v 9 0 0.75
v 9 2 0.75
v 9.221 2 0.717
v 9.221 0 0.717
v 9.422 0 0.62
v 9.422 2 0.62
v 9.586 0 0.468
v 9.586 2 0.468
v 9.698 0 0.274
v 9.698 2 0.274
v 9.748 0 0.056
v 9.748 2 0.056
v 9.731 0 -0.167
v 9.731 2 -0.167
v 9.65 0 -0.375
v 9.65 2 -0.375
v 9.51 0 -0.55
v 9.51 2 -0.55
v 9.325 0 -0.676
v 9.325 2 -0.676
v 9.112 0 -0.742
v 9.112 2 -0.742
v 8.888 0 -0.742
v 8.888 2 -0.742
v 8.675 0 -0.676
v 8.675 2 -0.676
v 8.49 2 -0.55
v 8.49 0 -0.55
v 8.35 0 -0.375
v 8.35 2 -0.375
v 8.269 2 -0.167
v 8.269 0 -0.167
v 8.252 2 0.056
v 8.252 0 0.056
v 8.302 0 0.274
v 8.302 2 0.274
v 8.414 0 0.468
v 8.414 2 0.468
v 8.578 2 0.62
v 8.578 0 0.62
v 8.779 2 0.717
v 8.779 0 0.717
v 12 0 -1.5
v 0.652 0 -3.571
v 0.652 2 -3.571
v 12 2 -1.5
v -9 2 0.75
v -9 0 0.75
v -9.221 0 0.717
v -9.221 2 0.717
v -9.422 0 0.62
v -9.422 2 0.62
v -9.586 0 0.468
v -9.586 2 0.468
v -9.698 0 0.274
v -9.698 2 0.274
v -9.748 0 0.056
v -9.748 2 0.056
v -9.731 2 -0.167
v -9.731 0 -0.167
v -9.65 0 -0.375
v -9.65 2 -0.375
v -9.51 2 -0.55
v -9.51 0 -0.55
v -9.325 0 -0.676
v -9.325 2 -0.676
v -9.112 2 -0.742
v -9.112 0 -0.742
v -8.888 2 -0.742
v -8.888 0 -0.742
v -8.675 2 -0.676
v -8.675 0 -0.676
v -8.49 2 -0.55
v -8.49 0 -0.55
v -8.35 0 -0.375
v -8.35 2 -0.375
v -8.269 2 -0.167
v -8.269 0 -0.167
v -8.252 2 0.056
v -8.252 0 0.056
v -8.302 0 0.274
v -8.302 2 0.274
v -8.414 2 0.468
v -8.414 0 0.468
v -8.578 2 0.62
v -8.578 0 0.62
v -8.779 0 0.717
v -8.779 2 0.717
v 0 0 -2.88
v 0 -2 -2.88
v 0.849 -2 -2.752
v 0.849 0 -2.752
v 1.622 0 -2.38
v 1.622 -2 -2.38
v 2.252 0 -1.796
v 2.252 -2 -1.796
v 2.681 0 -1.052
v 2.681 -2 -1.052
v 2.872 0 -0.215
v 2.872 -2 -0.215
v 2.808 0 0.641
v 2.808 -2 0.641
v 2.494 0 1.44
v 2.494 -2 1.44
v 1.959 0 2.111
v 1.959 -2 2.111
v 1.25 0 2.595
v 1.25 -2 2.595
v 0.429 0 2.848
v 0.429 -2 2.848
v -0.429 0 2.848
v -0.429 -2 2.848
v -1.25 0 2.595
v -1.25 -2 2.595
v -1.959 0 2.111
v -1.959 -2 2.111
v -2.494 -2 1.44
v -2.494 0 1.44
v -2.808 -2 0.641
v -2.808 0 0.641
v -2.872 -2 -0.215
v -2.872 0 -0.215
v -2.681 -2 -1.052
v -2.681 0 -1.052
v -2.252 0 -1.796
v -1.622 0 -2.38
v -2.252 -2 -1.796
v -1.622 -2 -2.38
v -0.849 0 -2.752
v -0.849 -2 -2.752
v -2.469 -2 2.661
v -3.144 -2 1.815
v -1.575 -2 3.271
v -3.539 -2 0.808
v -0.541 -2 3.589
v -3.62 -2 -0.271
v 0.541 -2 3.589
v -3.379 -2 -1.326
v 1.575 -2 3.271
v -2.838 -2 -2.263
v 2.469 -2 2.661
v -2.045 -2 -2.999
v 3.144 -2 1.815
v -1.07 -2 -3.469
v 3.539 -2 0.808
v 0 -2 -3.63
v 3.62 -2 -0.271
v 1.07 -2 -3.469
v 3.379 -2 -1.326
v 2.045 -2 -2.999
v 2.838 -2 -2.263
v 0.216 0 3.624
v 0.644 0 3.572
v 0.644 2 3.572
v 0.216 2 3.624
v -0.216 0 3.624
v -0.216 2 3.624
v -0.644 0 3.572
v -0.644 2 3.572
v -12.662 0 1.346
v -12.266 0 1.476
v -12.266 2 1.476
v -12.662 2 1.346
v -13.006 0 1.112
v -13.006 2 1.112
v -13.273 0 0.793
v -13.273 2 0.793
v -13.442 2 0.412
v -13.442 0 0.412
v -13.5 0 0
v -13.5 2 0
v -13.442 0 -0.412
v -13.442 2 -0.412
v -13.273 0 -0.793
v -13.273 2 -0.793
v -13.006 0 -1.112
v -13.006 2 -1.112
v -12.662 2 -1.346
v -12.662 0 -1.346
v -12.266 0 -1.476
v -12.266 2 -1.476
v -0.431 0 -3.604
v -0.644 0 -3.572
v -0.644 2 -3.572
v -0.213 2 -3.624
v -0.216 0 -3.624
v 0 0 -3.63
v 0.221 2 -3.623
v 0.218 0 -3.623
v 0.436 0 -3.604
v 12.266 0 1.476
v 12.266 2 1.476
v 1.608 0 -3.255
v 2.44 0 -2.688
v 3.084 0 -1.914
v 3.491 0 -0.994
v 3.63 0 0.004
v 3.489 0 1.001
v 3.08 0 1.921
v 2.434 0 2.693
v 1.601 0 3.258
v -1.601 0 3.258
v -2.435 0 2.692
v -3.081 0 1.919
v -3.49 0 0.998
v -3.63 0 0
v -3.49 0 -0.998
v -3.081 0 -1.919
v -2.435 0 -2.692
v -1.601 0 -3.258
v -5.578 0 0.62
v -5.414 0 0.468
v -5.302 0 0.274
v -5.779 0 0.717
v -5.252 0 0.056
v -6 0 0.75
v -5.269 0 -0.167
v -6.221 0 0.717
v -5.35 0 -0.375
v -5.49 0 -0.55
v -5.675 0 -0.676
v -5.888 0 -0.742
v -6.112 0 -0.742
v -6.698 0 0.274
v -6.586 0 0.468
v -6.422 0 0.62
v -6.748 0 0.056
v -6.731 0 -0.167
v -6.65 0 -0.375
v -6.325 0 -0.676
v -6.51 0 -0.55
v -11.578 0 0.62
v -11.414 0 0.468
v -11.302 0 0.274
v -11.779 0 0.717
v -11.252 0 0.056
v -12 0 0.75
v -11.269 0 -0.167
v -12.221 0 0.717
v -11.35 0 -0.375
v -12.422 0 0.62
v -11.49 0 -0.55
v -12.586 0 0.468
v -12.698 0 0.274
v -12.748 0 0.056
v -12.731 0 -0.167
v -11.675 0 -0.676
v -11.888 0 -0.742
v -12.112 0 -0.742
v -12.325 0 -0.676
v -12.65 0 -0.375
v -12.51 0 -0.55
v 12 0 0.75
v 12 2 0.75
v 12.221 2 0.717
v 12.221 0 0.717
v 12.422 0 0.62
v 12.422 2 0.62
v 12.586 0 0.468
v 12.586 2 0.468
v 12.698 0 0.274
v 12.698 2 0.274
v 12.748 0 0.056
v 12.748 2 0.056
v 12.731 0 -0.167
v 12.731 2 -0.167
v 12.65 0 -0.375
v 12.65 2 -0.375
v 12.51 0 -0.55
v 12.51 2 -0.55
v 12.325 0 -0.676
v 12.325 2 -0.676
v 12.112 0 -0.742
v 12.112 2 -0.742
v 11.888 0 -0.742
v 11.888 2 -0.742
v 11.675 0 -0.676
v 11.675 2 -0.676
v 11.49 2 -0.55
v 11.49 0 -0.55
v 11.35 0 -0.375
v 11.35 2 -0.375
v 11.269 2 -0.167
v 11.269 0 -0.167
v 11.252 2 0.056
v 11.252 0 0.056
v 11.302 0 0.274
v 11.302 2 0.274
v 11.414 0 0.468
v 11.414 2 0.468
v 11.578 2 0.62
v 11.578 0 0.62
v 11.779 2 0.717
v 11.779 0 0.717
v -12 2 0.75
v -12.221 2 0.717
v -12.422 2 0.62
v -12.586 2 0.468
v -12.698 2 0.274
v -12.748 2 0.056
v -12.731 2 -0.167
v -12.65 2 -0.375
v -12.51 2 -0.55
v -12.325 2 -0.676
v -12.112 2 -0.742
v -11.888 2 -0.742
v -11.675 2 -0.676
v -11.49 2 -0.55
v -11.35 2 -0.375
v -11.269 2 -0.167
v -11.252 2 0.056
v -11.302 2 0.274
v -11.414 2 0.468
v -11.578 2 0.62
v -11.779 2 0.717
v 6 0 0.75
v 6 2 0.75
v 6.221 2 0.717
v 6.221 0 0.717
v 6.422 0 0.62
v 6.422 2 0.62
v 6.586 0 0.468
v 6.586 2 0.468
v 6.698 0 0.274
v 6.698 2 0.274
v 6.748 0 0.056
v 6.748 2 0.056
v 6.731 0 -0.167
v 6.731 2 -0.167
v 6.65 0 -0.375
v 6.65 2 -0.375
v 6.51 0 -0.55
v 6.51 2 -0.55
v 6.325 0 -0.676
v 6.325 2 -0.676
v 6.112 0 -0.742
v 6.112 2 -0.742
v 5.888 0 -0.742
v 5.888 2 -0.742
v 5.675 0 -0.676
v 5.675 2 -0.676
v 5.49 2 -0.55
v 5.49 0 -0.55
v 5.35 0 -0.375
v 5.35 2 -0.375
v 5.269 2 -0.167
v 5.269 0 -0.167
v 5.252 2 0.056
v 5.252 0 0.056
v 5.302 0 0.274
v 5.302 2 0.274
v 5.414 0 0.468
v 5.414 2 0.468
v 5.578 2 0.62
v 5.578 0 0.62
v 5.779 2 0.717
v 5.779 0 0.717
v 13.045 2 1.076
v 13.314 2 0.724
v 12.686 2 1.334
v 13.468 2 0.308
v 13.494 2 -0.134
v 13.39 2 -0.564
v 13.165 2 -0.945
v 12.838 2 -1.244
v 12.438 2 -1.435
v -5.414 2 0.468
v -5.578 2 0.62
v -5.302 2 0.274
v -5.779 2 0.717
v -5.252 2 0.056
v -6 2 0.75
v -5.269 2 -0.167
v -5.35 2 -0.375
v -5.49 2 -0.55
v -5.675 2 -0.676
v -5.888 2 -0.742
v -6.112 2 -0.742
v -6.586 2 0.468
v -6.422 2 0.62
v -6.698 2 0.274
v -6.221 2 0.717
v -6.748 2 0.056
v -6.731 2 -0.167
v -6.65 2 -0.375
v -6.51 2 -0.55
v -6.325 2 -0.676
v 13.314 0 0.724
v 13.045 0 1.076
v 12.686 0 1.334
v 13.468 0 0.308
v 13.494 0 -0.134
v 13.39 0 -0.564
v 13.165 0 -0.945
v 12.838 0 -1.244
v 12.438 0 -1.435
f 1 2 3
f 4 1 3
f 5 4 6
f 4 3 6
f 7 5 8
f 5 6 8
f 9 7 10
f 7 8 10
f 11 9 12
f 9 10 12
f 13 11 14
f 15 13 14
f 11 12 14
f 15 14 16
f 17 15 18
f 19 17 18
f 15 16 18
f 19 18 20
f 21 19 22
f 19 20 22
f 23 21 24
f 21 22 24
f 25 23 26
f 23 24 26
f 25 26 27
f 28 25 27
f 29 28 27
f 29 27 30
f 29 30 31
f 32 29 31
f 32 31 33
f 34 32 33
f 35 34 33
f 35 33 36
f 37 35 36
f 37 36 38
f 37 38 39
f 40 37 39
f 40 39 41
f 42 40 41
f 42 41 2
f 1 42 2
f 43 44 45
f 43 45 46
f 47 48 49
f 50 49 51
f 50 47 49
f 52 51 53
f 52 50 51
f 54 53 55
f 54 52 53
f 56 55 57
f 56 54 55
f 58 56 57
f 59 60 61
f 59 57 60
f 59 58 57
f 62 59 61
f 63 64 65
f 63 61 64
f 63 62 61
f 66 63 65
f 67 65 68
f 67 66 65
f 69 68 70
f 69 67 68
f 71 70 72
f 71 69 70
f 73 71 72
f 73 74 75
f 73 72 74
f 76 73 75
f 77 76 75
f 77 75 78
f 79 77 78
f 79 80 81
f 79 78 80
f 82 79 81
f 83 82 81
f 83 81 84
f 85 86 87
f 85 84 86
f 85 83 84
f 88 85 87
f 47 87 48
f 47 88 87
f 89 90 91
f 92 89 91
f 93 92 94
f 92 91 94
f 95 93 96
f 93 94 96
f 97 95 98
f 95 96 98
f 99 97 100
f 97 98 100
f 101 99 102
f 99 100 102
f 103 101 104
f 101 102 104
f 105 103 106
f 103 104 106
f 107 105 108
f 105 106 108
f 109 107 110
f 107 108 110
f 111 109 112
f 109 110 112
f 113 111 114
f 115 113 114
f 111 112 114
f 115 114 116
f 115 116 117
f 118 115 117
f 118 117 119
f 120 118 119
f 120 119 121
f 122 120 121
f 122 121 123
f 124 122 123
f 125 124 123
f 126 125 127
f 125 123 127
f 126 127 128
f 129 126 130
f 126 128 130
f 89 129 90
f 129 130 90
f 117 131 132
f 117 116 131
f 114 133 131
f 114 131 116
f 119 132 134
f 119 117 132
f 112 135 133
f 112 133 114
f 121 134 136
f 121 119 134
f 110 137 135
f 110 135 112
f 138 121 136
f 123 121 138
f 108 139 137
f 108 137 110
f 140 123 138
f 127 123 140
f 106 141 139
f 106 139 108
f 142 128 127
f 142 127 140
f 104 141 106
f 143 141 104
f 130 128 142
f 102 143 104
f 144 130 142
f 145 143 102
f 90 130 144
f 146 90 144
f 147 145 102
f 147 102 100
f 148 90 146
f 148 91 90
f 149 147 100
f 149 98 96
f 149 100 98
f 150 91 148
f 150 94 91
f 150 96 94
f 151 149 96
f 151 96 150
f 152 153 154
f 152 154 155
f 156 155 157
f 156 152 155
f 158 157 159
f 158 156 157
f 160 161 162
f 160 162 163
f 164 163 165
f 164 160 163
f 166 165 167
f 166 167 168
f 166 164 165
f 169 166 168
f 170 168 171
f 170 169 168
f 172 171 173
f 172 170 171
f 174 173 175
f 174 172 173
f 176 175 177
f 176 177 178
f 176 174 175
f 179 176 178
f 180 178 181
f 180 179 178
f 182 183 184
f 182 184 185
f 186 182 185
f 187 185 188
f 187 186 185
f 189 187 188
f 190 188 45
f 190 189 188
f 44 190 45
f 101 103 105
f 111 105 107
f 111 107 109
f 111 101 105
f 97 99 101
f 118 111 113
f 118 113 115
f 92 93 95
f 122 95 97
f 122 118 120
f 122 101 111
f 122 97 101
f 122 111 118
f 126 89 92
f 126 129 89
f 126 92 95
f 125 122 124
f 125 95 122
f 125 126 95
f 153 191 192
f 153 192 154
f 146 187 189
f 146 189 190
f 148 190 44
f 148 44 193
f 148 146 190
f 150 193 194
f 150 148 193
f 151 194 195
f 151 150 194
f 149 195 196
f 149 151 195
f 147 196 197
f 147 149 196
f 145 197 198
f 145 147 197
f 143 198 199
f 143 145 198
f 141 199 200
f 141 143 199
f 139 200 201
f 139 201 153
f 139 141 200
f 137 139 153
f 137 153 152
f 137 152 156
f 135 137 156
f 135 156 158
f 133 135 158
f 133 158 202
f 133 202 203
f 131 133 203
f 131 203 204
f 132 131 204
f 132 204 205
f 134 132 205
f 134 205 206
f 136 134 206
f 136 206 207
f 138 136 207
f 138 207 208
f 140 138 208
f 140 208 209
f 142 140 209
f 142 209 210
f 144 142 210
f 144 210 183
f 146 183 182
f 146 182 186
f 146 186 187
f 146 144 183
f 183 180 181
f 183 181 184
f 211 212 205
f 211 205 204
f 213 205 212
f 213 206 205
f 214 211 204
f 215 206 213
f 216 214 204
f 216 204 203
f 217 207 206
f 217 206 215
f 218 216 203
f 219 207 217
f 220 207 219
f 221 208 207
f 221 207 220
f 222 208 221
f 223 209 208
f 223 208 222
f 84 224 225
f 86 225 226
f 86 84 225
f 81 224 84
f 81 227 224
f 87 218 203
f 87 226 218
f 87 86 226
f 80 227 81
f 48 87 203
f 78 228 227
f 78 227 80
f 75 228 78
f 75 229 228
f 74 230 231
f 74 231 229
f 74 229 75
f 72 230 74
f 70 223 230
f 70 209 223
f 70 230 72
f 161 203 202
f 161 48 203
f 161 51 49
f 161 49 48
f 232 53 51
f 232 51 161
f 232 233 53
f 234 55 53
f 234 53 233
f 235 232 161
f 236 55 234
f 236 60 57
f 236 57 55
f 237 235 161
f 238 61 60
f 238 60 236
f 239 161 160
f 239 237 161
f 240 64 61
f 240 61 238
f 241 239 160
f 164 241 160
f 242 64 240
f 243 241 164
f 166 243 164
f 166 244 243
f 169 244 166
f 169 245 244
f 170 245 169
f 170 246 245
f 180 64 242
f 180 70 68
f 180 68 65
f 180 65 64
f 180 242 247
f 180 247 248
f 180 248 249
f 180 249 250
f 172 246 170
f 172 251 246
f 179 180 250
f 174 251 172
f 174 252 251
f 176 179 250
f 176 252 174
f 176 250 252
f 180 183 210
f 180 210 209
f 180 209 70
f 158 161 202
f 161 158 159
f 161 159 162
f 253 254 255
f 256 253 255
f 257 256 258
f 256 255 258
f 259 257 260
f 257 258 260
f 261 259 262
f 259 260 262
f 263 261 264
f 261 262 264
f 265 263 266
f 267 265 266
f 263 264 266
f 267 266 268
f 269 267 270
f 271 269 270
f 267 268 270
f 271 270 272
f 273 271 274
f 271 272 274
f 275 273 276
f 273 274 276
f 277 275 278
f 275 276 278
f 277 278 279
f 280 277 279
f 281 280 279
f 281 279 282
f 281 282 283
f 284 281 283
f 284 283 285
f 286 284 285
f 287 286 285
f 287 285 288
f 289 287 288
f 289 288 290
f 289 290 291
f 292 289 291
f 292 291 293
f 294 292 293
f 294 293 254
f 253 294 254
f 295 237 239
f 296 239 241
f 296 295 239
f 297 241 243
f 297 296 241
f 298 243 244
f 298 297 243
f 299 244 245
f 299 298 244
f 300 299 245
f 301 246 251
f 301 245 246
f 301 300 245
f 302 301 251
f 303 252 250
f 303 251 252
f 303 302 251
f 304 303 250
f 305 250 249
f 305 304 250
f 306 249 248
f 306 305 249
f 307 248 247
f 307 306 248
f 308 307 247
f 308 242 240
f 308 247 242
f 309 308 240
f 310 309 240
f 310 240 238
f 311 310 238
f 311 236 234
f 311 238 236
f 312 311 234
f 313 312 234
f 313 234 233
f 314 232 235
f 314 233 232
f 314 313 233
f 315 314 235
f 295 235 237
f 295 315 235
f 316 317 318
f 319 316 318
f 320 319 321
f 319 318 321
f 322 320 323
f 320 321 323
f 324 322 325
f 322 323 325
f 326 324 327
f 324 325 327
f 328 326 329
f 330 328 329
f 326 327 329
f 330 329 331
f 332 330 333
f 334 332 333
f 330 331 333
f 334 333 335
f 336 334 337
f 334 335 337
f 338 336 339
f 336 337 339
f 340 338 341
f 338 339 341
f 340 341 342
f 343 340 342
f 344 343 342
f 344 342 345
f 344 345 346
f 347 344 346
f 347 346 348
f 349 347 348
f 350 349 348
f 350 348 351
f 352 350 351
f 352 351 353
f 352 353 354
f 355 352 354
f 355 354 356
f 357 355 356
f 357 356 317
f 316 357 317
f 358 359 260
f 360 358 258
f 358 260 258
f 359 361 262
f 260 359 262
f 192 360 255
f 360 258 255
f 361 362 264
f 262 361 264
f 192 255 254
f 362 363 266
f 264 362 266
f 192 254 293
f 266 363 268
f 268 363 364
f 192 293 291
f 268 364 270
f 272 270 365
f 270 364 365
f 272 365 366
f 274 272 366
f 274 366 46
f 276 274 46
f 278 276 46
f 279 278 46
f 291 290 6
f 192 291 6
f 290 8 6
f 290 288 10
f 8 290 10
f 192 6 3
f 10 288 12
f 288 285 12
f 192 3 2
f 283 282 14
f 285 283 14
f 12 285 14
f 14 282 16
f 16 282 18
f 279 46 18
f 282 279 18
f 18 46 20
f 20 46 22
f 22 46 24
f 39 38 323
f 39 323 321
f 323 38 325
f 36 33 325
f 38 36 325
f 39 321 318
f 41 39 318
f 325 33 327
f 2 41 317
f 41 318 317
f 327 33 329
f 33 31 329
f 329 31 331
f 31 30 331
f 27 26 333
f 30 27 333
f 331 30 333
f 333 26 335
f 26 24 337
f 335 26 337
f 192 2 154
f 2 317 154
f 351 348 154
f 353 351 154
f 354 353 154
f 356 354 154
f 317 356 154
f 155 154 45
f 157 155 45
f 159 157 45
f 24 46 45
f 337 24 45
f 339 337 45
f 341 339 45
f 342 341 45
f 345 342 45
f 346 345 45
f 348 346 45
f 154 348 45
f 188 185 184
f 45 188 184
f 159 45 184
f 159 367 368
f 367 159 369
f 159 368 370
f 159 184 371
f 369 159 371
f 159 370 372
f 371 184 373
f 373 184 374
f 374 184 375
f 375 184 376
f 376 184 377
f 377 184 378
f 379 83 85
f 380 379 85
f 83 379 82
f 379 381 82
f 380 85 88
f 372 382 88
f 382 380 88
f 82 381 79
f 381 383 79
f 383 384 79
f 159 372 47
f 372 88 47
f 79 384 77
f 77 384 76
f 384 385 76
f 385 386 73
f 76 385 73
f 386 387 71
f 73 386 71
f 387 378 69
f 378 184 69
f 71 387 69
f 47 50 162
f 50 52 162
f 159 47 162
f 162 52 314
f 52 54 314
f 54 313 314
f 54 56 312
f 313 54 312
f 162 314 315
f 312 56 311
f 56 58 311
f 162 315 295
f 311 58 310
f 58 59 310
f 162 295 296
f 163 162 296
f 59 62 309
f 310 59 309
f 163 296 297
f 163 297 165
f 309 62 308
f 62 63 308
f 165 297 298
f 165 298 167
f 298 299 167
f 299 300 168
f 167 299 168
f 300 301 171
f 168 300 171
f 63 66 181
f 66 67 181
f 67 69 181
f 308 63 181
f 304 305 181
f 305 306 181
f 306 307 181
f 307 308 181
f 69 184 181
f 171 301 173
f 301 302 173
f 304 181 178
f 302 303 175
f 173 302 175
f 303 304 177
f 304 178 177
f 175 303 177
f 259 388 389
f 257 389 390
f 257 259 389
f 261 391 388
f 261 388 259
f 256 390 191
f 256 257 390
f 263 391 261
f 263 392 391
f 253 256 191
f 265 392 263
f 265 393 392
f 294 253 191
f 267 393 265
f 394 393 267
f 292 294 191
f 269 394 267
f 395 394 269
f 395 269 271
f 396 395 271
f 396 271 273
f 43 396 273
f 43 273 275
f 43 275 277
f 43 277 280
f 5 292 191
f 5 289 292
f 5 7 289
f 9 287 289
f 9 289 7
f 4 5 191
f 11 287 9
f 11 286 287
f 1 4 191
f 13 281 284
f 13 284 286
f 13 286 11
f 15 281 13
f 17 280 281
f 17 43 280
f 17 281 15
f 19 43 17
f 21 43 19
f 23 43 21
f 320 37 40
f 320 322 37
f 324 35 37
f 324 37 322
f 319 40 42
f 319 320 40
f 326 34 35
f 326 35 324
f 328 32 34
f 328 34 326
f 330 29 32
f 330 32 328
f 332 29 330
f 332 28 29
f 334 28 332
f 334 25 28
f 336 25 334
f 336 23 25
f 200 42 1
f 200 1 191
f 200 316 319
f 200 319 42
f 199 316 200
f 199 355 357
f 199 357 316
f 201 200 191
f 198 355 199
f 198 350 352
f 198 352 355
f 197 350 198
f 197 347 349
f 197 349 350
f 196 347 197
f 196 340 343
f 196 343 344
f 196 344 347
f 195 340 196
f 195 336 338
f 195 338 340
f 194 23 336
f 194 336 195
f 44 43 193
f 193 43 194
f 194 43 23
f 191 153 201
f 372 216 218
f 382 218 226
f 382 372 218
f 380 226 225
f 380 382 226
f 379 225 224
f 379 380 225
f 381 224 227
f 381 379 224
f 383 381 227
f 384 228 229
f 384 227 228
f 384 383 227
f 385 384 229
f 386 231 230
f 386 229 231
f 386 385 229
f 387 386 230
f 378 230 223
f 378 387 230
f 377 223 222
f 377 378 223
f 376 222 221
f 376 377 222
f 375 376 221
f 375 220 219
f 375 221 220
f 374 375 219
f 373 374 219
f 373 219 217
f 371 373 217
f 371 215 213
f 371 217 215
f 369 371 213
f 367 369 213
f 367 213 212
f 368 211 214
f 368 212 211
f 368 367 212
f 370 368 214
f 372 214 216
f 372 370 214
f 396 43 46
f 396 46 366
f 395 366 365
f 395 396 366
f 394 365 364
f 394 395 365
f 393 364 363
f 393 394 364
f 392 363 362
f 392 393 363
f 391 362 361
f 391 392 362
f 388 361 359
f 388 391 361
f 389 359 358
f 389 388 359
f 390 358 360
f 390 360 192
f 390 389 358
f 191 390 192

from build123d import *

# Parameters (mm, degrees)
BOSS_EXTRUDE1_DEPTH = 2
SKETCH2_R           = 0.75
CUT_EXTRUDE1_DEPTH  = 15.121858943
BOSS_EXTRUDE2_START = 2
SKETCH4_R           = 3.63
SKETCH4_R_2         = 2.88
BOSS_EXTRUDE2_DEPTH = 2


with BuildPart() as part:
    # Sketch1 → Boss-Extrude1 (new body)
    with BuildSketch(Plane(origin=(0, 0, 0), x_dir=(1, 0, 0), z_dir=(0, 1, 0))):
        with BuildLine():
            Line((-12.26625, 1.476181201), (-0.644325, 3.572358506))
            ThreePointArc((-0.644325, 3.572358506), (0.003746369, 3.629998067), (0.651697383, 3.571020935))
            Line((0.651697383, 3.571020935), (12, 1.5))
            ThreePointArc((12, 1.5), (13.494033434, 0.133656648), (12.26625, -1.476181201))
            Line((12.26625, -1.476181201), (0.644325, -3.572358506))
            ThreePointArc((0.644325, -3.572358506), (0, -3.63), (-0.644325, -3.572358506))
            Line((-0.644325, -3.572358506), (-12.26625, -1.476181201))
            ThreePointArc((-12.26625, -1.476181201), (-13.5, 0), (-12.26625, 1.476181201))
        make_face()
    extrude(amount=BOSS_EXTRUDE1_DEPTH)

    # Sketch2 → Cut-Extrude1 (cut, through all)
    with BuildSketch(Plane(origin=(0, 2, 0), x_dir=(1, 0, 0), z_dir=(0, 1, 0))):
        with Locations(Location((12, 0, 0), (0, 0, 270))):
            Circle(SKETCH2_R)
        with Locations(Location((9, 0, 0), (0, 0, 270))):
            Circle(SKETCH2_R)
        with Locations(Location((6, 0, 0), (0, 0, 270))):
            Circle(SKETCH2_R)
    cut_extrude1 = extrude(amount=-CUT_EXTRUDE1_DEPTH, mode=Mode.SUBTRACT)

    # Mirror1: Cut-Extrude1 across plane
    add(cut_extrude1.mirror(Plane(origin=(0, 0, 0), x_dir=(0, 0, 1), z_dir=(1, 0, 0))), mode=Mode.SUBTRACT)

    # Sketch4 → Boss-Extrude2 (add)
    with BuildSketch(Plane.XZ.offset(BOSS_EXTRUDE2_START)):
        with Locations(Location((0, 0, 0), (0, 0, 270))):
            Circle(SKETCH4_R)
        with Locations(Location((0, 0, 0), (0, 0, 270))):
            Circle(SKETCH4_R_2, mode=Mode.SUBTRACT)
    extrude(amount=-BOSS_EXTRUDE2_DEPTH)


solid = part.part
